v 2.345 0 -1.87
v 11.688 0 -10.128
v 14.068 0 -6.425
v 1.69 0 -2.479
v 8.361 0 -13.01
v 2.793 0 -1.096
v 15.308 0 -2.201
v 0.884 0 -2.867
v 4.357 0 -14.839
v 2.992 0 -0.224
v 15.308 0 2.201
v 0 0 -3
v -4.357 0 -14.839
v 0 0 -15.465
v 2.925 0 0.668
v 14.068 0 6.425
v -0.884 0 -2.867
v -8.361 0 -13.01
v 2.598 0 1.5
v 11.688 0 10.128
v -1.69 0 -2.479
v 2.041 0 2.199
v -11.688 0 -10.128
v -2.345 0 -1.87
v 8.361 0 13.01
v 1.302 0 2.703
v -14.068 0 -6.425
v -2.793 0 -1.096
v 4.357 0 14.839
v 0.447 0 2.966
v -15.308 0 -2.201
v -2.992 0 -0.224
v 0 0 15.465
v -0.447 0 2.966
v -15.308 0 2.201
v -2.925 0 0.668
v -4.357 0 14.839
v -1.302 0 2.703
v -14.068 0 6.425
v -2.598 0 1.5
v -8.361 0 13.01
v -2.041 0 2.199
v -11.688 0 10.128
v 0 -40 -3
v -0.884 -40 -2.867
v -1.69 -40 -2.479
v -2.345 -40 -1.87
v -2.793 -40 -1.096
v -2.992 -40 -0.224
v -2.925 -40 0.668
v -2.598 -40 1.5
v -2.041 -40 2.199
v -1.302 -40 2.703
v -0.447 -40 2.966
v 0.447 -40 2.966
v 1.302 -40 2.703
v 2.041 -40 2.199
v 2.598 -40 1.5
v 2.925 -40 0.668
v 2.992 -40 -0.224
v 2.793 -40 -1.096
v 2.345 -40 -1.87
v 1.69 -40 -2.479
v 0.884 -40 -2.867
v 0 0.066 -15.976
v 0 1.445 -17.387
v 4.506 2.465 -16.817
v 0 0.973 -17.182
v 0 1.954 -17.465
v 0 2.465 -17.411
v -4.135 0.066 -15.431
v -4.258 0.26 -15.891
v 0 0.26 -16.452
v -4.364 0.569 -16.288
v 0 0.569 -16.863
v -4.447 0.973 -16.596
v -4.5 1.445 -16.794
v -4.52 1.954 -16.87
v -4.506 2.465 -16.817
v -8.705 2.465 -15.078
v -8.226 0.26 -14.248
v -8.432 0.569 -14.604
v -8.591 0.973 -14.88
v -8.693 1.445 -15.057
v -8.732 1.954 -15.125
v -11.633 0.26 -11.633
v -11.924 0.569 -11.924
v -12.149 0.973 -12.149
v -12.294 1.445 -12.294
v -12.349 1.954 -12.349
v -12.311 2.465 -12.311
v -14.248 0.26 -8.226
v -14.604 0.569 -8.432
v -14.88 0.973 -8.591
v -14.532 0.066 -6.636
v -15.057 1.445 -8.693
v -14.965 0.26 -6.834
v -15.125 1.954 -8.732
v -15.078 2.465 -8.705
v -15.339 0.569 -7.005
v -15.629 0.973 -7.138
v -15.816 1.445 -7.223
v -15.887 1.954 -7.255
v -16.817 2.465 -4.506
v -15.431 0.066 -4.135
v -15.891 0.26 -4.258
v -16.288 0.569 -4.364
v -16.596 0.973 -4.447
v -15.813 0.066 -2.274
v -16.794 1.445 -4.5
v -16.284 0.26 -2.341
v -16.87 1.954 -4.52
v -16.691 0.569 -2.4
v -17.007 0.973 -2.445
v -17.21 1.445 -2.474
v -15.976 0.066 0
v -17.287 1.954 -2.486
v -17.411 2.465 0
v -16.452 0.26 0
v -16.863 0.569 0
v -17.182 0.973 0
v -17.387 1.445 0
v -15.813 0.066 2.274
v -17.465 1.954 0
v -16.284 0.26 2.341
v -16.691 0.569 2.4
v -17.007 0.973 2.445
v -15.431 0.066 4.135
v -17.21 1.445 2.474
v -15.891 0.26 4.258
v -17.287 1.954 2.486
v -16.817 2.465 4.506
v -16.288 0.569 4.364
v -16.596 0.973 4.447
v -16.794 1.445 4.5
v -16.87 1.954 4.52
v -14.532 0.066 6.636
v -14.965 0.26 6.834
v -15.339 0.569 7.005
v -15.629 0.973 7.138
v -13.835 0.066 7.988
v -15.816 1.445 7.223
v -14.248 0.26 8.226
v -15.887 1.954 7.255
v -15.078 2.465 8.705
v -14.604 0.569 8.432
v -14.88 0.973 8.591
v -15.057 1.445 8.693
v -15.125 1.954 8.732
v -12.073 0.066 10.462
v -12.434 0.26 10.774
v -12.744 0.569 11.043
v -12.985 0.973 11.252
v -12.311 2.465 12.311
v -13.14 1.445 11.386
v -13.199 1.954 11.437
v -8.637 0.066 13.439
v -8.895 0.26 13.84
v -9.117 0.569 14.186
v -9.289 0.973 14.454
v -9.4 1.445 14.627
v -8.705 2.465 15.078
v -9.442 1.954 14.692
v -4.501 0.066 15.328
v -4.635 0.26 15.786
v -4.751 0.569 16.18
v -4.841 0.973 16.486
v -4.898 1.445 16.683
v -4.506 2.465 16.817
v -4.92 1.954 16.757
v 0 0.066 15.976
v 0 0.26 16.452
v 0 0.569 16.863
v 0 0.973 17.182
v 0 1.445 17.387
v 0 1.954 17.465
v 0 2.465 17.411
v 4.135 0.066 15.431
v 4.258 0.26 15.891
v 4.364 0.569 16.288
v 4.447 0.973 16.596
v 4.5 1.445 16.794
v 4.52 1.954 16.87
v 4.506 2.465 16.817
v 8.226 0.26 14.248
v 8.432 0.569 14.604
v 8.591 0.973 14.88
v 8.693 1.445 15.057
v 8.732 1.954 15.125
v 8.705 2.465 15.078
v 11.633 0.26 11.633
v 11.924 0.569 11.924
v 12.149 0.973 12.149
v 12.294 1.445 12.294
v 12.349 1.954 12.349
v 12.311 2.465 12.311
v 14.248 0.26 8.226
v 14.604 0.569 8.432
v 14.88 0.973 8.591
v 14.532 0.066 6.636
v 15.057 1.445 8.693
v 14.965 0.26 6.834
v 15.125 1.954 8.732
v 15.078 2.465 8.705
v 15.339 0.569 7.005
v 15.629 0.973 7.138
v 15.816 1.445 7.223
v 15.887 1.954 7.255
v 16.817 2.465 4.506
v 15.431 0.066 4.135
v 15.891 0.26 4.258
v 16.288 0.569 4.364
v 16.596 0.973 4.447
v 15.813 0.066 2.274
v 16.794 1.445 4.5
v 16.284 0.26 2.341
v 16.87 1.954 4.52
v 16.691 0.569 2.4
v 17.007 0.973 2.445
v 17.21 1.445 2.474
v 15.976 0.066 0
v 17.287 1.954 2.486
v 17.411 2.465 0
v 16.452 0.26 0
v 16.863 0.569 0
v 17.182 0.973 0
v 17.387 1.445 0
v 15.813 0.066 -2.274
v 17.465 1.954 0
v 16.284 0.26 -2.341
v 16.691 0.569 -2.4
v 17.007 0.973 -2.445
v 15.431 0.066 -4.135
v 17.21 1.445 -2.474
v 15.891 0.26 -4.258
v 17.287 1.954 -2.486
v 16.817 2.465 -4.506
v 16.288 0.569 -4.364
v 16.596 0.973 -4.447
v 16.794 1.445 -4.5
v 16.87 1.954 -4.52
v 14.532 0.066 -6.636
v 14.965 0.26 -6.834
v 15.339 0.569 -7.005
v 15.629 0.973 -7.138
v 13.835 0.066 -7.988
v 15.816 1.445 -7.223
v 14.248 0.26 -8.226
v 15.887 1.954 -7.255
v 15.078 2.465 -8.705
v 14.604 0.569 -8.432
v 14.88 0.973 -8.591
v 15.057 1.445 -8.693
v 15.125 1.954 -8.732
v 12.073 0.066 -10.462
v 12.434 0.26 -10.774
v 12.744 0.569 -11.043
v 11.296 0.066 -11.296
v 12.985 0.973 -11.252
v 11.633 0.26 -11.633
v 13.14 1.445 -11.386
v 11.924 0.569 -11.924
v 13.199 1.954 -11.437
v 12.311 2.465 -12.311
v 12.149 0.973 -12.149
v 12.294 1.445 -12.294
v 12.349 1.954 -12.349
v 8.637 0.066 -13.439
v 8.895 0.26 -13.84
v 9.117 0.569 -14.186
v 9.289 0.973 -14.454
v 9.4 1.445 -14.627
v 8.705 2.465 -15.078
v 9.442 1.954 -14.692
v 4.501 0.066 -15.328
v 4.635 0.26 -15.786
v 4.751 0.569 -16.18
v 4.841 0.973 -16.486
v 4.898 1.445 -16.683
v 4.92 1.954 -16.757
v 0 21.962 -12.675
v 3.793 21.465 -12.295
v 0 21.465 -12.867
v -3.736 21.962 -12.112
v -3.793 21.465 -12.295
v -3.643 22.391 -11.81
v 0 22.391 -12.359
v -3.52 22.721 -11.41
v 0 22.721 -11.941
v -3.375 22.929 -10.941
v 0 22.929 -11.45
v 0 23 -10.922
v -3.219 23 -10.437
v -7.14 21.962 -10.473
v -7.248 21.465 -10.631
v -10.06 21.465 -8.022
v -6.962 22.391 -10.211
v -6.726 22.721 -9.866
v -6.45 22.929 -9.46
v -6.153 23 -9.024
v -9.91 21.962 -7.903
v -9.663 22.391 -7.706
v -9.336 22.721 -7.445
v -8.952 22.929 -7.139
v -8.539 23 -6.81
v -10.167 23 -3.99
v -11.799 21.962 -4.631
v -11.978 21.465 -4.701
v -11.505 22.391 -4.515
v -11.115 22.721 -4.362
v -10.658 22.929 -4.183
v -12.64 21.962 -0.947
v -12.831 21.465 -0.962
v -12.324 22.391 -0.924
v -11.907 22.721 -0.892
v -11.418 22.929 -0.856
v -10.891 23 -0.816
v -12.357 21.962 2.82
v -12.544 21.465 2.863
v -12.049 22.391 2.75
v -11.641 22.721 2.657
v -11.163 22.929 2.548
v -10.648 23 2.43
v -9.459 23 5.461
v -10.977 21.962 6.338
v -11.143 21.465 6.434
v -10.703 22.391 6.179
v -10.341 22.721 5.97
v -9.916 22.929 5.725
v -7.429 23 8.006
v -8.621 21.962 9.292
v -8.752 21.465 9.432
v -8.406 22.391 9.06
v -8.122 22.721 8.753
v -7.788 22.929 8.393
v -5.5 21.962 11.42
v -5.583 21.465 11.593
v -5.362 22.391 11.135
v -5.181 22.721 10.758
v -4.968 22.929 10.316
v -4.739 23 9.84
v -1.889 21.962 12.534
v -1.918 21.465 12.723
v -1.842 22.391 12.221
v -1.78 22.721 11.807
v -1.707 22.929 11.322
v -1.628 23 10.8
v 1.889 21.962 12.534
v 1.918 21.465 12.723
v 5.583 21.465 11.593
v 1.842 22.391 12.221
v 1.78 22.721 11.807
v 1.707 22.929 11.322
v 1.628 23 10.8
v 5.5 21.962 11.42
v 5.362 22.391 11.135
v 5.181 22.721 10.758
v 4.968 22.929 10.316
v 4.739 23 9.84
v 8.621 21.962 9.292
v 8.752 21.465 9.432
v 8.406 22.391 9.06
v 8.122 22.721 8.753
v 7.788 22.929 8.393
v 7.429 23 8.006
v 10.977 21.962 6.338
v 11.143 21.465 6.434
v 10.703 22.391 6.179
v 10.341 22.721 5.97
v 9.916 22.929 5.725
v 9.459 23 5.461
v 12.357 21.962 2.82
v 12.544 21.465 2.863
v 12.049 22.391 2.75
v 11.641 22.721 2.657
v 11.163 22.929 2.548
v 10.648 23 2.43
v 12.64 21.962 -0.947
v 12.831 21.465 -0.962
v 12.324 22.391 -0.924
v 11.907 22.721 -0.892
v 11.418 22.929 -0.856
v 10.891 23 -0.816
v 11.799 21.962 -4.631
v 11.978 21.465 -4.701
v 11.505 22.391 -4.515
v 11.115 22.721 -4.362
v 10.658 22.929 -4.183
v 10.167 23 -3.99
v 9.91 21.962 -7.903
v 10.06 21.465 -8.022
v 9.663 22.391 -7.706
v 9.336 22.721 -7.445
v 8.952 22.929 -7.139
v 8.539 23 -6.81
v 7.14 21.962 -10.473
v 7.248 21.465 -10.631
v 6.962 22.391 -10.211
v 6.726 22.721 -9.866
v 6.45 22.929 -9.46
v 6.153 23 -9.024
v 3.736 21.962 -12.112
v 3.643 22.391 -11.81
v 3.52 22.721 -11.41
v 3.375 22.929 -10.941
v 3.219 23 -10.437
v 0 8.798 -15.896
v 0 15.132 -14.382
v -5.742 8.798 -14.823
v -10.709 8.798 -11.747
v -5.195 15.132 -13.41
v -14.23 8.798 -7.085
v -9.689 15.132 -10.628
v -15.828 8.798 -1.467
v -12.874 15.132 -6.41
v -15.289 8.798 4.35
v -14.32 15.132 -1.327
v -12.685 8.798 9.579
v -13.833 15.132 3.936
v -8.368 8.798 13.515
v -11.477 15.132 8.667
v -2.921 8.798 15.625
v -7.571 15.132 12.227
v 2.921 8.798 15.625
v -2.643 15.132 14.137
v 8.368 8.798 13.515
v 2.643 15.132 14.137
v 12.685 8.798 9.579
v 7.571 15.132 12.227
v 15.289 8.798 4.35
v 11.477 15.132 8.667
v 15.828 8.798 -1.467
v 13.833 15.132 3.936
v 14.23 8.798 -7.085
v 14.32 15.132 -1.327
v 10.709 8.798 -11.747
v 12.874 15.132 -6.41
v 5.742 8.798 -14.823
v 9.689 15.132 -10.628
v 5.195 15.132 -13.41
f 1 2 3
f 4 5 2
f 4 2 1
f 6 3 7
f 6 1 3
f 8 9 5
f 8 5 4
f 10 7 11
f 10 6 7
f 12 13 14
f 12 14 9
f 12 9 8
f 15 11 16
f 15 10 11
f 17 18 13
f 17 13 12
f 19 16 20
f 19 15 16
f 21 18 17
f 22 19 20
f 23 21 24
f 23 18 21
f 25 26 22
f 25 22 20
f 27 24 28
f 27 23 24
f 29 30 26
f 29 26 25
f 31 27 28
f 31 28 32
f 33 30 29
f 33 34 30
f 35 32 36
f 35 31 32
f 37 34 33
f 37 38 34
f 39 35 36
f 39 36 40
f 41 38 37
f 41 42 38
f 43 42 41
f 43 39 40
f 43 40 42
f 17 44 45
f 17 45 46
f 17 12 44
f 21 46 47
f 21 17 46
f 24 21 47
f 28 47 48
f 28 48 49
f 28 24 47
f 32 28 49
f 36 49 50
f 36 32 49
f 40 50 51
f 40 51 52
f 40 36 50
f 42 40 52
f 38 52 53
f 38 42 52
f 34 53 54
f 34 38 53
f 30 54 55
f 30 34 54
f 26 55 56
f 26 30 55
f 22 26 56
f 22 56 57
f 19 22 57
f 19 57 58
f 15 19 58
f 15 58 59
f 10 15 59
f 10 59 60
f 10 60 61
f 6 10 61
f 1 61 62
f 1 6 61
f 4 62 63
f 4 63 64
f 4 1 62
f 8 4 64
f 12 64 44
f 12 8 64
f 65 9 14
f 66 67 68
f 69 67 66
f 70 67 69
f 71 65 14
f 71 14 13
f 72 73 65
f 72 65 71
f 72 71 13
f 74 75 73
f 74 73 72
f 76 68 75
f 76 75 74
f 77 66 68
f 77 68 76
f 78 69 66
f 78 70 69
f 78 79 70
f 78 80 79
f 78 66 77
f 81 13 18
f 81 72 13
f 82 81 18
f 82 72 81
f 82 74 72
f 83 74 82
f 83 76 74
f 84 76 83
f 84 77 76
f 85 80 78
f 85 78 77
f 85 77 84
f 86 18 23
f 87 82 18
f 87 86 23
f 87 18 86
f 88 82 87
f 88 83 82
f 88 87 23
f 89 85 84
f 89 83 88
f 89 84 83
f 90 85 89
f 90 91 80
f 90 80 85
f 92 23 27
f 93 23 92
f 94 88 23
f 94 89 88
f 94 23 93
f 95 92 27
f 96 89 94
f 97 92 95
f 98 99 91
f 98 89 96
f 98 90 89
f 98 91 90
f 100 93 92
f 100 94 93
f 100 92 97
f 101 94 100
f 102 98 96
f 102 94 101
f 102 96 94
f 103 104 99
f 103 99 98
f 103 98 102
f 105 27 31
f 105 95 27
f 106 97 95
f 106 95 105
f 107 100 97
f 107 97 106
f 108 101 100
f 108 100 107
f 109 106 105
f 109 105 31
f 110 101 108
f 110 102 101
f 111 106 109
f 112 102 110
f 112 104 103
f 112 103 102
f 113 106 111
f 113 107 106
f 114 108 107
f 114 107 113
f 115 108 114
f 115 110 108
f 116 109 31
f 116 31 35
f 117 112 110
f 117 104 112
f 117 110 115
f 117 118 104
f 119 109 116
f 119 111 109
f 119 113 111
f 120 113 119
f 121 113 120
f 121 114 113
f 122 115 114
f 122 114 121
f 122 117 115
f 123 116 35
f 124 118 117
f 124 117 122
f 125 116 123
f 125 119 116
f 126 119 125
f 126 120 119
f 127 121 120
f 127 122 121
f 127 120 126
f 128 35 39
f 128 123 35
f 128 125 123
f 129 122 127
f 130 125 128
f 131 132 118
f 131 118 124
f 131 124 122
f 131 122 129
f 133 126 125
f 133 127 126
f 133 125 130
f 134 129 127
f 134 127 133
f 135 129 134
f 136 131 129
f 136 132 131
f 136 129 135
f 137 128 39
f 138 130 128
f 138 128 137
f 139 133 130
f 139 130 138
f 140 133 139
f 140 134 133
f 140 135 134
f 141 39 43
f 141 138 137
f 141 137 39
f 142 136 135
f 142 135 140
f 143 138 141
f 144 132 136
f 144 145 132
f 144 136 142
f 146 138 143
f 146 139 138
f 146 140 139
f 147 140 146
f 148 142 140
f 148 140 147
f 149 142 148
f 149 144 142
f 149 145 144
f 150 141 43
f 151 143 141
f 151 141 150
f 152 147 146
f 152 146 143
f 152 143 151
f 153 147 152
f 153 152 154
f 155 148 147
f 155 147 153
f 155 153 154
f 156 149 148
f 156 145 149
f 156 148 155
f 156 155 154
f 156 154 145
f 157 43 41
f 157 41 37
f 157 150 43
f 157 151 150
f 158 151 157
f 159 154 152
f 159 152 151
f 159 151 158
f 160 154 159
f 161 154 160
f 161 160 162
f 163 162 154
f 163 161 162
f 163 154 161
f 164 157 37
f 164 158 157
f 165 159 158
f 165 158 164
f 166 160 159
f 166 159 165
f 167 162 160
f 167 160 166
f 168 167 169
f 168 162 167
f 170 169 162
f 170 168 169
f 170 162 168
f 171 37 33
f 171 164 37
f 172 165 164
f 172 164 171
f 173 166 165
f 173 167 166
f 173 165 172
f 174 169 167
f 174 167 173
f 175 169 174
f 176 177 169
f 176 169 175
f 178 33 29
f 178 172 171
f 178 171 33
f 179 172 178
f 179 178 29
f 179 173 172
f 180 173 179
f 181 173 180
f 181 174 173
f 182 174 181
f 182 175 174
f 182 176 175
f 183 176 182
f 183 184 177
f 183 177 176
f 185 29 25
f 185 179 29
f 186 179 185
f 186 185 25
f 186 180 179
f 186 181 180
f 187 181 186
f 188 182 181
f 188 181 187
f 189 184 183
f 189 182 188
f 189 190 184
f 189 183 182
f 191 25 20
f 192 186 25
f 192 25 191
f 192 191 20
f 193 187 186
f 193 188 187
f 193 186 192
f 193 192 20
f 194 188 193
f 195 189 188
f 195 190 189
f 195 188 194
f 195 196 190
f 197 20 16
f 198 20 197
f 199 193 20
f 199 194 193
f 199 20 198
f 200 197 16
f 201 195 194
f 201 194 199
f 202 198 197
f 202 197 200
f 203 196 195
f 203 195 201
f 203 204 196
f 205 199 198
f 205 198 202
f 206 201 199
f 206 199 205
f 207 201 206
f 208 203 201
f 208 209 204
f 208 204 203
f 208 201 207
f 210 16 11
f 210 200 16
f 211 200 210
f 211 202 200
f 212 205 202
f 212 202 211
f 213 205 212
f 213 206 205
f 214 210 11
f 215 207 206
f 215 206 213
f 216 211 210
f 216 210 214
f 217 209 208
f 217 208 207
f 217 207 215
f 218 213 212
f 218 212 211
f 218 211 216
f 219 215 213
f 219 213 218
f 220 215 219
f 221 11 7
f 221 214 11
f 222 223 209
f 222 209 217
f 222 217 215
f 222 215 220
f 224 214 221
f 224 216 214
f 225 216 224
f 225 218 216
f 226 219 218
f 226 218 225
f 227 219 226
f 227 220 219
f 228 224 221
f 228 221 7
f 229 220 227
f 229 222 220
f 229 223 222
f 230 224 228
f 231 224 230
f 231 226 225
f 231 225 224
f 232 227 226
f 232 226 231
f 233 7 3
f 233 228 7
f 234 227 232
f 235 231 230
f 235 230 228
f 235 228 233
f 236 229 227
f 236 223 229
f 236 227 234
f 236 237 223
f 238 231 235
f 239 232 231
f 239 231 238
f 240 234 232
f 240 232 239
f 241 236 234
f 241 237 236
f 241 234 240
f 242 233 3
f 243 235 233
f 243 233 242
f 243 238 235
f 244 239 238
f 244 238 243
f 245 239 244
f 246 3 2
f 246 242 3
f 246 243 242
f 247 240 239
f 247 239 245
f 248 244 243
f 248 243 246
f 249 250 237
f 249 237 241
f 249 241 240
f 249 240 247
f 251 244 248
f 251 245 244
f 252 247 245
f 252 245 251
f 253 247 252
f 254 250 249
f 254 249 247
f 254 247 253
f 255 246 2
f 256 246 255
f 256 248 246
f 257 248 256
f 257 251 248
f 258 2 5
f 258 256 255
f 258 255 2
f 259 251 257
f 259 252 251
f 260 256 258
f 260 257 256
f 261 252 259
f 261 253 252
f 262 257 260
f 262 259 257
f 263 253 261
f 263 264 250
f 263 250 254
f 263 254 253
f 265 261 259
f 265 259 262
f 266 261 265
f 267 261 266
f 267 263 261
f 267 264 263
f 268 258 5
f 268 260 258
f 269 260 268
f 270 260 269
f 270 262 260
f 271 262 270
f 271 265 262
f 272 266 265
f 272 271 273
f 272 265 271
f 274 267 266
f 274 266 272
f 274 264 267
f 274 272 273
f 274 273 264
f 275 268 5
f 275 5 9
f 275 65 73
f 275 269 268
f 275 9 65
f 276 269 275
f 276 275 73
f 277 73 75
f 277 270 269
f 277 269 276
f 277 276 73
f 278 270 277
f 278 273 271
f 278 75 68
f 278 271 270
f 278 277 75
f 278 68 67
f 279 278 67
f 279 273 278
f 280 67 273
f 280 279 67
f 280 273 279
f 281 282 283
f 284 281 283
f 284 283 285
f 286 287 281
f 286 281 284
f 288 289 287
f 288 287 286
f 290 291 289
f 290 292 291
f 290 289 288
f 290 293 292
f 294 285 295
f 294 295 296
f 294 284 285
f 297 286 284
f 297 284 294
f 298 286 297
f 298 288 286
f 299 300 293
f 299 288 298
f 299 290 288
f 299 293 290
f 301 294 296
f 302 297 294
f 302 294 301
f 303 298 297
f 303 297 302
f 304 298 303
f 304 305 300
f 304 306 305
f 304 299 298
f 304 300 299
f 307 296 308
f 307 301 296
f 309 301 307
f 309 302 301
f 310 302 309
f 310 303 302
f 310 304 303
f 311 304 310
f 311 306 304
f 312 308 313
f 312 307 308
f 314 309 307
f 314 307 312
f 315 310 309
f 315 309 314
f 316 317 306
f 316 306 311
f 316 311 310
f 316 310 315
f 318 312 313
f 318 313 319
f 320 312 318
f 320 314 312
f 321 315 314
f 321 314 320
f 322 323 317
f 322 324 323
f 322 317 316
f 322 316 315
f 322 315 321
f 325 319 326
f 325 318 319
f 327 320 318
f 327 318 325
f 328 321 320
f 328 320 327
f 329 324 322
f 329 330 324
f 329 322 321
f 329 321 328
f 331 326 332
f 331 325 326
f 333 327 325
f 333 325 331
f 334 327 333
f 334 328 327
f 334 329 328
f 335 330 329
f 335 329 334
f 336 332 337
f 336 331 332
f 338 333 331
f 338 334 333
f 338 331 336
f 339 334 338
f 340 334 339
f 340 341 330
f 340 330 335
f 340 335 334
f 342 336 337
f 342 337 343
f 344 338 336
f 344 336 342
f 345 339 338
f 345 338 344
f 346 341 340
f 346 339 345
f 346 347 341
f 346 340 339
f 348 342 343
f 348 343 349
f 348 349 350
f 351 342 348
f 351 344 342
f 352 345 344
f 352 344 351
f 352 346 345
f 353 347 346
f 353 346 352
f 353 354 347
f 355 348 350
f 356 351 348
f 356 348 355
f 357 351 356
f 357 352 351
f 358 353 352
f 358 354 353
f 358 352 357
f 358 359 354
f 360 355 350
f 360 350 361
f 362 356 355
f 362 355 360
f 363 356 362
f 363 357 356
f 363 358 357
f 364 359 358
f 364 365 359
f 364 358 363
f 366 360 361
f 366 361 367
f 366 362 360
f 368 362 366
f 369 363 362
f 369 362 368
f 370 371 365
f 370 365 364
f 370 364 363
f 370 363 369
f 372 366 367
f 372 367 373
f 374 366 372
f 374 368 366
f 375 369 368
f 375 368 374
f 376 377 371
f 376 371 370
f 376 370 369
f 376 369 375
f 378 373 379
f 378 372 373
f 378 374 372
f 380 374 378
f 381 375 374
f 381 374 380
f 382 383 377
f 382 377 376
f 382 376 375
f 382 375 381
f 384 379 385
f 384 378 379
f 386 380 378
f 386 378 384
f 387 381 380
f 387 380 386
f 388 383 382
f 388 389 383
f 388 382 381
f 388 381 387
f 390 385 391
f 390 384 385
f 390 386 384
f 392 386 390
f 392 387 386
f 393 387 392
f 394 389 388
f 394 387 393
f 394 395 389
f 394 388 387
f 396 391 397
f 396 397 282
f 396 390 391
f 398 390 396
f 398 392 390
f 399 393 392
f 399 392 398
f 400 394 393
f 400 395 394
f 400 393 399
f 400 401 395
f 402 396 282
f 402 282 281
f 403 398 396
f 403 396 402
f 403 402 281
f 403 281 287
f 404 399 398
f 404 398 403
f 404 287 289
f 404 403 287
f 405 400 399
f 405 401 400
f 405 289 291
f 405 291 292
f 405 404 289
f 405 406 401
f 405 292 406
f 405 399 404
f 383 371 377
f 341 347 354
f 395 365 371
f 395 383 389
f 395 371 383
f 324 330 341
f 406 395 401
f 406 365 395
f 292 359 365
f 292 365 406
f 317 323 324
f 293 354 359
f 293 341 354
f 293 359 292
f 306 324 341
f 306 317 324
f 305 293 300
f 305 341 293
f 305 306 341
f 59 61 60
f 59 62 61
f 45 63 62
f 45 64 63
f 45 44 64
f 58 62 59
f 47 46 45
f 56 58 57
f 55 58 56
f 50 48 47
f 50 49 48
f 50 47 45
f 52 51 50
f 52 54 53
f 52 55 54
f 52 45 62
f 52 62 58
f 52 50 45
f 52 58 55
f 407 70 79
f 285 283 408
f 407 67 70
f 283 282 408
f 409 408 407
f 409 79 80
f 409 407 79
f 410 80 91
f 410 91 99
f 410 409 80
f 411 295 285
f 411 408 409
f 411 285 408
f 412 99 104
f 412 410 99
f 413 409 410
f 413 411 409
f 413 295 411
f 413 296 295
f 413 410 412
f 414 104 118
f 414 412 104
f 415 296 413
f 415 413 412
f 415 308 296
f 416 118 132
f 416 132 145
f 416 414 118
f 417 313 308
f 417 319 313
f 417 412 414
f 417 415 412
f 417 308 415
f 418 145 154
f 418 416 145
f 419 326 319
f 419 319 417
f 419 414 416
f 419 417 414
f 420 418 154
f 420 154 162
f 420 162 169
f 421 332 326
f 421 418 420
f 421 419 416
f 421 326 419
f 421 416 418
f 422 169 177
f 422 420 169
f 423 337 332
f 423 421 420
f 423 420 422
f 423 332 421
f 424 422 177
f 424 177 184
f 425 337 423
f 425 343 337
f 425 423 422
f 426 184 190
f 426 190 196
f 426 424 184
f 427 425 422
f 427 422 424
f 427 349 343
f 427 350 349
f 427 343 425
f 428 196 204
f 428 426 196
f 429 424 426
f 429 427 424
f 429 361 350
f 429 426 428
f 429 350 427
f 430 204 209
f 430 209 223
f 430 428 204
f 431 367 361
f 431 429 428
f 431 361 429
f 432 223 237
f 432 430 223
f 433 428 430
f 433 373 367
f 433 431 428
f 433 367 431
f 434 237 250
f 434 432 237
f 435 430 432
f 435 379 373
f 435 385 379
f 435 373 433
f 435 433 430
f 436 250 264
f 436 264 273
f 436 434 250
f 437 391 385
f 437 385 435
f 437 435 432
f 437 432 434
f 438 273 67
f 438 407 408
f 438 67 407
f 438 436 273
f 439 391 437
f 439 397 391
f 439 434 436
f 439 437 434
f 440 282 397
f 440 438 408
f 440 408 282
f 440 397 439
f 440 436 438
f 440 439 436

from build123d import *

# Parameters (mm, degrees)
FILLET_1_R = 2


with BuildPart() as part:
    # 草图2 → 旋转1 (revolve)
    with BuildSketch(Plane.XY, mode=Mode.PRIVATE) as revolve_1_sk:
        Polygon((3, 0), (18, 0), (12.5, 23), (0, 23), (0, 0), (0, -40), (3, -40), align=None)
    revolve(revolve_1_sk.sketch.rotate(Axis((0, 0, 0), (0, 1, 0)), 90), axis=Axis((0, 0, 0), (0, 1, 0)))

    # 圆角1
    fillet_1_edges = [part.edges().sort_by_distance(p)[0] for p in [
        (0, 0, 18),
        (0, 23, 12.5),
    ]]
    fillet(fillet_1_edges, radius=FILLET_1_R)


solid = part.part
